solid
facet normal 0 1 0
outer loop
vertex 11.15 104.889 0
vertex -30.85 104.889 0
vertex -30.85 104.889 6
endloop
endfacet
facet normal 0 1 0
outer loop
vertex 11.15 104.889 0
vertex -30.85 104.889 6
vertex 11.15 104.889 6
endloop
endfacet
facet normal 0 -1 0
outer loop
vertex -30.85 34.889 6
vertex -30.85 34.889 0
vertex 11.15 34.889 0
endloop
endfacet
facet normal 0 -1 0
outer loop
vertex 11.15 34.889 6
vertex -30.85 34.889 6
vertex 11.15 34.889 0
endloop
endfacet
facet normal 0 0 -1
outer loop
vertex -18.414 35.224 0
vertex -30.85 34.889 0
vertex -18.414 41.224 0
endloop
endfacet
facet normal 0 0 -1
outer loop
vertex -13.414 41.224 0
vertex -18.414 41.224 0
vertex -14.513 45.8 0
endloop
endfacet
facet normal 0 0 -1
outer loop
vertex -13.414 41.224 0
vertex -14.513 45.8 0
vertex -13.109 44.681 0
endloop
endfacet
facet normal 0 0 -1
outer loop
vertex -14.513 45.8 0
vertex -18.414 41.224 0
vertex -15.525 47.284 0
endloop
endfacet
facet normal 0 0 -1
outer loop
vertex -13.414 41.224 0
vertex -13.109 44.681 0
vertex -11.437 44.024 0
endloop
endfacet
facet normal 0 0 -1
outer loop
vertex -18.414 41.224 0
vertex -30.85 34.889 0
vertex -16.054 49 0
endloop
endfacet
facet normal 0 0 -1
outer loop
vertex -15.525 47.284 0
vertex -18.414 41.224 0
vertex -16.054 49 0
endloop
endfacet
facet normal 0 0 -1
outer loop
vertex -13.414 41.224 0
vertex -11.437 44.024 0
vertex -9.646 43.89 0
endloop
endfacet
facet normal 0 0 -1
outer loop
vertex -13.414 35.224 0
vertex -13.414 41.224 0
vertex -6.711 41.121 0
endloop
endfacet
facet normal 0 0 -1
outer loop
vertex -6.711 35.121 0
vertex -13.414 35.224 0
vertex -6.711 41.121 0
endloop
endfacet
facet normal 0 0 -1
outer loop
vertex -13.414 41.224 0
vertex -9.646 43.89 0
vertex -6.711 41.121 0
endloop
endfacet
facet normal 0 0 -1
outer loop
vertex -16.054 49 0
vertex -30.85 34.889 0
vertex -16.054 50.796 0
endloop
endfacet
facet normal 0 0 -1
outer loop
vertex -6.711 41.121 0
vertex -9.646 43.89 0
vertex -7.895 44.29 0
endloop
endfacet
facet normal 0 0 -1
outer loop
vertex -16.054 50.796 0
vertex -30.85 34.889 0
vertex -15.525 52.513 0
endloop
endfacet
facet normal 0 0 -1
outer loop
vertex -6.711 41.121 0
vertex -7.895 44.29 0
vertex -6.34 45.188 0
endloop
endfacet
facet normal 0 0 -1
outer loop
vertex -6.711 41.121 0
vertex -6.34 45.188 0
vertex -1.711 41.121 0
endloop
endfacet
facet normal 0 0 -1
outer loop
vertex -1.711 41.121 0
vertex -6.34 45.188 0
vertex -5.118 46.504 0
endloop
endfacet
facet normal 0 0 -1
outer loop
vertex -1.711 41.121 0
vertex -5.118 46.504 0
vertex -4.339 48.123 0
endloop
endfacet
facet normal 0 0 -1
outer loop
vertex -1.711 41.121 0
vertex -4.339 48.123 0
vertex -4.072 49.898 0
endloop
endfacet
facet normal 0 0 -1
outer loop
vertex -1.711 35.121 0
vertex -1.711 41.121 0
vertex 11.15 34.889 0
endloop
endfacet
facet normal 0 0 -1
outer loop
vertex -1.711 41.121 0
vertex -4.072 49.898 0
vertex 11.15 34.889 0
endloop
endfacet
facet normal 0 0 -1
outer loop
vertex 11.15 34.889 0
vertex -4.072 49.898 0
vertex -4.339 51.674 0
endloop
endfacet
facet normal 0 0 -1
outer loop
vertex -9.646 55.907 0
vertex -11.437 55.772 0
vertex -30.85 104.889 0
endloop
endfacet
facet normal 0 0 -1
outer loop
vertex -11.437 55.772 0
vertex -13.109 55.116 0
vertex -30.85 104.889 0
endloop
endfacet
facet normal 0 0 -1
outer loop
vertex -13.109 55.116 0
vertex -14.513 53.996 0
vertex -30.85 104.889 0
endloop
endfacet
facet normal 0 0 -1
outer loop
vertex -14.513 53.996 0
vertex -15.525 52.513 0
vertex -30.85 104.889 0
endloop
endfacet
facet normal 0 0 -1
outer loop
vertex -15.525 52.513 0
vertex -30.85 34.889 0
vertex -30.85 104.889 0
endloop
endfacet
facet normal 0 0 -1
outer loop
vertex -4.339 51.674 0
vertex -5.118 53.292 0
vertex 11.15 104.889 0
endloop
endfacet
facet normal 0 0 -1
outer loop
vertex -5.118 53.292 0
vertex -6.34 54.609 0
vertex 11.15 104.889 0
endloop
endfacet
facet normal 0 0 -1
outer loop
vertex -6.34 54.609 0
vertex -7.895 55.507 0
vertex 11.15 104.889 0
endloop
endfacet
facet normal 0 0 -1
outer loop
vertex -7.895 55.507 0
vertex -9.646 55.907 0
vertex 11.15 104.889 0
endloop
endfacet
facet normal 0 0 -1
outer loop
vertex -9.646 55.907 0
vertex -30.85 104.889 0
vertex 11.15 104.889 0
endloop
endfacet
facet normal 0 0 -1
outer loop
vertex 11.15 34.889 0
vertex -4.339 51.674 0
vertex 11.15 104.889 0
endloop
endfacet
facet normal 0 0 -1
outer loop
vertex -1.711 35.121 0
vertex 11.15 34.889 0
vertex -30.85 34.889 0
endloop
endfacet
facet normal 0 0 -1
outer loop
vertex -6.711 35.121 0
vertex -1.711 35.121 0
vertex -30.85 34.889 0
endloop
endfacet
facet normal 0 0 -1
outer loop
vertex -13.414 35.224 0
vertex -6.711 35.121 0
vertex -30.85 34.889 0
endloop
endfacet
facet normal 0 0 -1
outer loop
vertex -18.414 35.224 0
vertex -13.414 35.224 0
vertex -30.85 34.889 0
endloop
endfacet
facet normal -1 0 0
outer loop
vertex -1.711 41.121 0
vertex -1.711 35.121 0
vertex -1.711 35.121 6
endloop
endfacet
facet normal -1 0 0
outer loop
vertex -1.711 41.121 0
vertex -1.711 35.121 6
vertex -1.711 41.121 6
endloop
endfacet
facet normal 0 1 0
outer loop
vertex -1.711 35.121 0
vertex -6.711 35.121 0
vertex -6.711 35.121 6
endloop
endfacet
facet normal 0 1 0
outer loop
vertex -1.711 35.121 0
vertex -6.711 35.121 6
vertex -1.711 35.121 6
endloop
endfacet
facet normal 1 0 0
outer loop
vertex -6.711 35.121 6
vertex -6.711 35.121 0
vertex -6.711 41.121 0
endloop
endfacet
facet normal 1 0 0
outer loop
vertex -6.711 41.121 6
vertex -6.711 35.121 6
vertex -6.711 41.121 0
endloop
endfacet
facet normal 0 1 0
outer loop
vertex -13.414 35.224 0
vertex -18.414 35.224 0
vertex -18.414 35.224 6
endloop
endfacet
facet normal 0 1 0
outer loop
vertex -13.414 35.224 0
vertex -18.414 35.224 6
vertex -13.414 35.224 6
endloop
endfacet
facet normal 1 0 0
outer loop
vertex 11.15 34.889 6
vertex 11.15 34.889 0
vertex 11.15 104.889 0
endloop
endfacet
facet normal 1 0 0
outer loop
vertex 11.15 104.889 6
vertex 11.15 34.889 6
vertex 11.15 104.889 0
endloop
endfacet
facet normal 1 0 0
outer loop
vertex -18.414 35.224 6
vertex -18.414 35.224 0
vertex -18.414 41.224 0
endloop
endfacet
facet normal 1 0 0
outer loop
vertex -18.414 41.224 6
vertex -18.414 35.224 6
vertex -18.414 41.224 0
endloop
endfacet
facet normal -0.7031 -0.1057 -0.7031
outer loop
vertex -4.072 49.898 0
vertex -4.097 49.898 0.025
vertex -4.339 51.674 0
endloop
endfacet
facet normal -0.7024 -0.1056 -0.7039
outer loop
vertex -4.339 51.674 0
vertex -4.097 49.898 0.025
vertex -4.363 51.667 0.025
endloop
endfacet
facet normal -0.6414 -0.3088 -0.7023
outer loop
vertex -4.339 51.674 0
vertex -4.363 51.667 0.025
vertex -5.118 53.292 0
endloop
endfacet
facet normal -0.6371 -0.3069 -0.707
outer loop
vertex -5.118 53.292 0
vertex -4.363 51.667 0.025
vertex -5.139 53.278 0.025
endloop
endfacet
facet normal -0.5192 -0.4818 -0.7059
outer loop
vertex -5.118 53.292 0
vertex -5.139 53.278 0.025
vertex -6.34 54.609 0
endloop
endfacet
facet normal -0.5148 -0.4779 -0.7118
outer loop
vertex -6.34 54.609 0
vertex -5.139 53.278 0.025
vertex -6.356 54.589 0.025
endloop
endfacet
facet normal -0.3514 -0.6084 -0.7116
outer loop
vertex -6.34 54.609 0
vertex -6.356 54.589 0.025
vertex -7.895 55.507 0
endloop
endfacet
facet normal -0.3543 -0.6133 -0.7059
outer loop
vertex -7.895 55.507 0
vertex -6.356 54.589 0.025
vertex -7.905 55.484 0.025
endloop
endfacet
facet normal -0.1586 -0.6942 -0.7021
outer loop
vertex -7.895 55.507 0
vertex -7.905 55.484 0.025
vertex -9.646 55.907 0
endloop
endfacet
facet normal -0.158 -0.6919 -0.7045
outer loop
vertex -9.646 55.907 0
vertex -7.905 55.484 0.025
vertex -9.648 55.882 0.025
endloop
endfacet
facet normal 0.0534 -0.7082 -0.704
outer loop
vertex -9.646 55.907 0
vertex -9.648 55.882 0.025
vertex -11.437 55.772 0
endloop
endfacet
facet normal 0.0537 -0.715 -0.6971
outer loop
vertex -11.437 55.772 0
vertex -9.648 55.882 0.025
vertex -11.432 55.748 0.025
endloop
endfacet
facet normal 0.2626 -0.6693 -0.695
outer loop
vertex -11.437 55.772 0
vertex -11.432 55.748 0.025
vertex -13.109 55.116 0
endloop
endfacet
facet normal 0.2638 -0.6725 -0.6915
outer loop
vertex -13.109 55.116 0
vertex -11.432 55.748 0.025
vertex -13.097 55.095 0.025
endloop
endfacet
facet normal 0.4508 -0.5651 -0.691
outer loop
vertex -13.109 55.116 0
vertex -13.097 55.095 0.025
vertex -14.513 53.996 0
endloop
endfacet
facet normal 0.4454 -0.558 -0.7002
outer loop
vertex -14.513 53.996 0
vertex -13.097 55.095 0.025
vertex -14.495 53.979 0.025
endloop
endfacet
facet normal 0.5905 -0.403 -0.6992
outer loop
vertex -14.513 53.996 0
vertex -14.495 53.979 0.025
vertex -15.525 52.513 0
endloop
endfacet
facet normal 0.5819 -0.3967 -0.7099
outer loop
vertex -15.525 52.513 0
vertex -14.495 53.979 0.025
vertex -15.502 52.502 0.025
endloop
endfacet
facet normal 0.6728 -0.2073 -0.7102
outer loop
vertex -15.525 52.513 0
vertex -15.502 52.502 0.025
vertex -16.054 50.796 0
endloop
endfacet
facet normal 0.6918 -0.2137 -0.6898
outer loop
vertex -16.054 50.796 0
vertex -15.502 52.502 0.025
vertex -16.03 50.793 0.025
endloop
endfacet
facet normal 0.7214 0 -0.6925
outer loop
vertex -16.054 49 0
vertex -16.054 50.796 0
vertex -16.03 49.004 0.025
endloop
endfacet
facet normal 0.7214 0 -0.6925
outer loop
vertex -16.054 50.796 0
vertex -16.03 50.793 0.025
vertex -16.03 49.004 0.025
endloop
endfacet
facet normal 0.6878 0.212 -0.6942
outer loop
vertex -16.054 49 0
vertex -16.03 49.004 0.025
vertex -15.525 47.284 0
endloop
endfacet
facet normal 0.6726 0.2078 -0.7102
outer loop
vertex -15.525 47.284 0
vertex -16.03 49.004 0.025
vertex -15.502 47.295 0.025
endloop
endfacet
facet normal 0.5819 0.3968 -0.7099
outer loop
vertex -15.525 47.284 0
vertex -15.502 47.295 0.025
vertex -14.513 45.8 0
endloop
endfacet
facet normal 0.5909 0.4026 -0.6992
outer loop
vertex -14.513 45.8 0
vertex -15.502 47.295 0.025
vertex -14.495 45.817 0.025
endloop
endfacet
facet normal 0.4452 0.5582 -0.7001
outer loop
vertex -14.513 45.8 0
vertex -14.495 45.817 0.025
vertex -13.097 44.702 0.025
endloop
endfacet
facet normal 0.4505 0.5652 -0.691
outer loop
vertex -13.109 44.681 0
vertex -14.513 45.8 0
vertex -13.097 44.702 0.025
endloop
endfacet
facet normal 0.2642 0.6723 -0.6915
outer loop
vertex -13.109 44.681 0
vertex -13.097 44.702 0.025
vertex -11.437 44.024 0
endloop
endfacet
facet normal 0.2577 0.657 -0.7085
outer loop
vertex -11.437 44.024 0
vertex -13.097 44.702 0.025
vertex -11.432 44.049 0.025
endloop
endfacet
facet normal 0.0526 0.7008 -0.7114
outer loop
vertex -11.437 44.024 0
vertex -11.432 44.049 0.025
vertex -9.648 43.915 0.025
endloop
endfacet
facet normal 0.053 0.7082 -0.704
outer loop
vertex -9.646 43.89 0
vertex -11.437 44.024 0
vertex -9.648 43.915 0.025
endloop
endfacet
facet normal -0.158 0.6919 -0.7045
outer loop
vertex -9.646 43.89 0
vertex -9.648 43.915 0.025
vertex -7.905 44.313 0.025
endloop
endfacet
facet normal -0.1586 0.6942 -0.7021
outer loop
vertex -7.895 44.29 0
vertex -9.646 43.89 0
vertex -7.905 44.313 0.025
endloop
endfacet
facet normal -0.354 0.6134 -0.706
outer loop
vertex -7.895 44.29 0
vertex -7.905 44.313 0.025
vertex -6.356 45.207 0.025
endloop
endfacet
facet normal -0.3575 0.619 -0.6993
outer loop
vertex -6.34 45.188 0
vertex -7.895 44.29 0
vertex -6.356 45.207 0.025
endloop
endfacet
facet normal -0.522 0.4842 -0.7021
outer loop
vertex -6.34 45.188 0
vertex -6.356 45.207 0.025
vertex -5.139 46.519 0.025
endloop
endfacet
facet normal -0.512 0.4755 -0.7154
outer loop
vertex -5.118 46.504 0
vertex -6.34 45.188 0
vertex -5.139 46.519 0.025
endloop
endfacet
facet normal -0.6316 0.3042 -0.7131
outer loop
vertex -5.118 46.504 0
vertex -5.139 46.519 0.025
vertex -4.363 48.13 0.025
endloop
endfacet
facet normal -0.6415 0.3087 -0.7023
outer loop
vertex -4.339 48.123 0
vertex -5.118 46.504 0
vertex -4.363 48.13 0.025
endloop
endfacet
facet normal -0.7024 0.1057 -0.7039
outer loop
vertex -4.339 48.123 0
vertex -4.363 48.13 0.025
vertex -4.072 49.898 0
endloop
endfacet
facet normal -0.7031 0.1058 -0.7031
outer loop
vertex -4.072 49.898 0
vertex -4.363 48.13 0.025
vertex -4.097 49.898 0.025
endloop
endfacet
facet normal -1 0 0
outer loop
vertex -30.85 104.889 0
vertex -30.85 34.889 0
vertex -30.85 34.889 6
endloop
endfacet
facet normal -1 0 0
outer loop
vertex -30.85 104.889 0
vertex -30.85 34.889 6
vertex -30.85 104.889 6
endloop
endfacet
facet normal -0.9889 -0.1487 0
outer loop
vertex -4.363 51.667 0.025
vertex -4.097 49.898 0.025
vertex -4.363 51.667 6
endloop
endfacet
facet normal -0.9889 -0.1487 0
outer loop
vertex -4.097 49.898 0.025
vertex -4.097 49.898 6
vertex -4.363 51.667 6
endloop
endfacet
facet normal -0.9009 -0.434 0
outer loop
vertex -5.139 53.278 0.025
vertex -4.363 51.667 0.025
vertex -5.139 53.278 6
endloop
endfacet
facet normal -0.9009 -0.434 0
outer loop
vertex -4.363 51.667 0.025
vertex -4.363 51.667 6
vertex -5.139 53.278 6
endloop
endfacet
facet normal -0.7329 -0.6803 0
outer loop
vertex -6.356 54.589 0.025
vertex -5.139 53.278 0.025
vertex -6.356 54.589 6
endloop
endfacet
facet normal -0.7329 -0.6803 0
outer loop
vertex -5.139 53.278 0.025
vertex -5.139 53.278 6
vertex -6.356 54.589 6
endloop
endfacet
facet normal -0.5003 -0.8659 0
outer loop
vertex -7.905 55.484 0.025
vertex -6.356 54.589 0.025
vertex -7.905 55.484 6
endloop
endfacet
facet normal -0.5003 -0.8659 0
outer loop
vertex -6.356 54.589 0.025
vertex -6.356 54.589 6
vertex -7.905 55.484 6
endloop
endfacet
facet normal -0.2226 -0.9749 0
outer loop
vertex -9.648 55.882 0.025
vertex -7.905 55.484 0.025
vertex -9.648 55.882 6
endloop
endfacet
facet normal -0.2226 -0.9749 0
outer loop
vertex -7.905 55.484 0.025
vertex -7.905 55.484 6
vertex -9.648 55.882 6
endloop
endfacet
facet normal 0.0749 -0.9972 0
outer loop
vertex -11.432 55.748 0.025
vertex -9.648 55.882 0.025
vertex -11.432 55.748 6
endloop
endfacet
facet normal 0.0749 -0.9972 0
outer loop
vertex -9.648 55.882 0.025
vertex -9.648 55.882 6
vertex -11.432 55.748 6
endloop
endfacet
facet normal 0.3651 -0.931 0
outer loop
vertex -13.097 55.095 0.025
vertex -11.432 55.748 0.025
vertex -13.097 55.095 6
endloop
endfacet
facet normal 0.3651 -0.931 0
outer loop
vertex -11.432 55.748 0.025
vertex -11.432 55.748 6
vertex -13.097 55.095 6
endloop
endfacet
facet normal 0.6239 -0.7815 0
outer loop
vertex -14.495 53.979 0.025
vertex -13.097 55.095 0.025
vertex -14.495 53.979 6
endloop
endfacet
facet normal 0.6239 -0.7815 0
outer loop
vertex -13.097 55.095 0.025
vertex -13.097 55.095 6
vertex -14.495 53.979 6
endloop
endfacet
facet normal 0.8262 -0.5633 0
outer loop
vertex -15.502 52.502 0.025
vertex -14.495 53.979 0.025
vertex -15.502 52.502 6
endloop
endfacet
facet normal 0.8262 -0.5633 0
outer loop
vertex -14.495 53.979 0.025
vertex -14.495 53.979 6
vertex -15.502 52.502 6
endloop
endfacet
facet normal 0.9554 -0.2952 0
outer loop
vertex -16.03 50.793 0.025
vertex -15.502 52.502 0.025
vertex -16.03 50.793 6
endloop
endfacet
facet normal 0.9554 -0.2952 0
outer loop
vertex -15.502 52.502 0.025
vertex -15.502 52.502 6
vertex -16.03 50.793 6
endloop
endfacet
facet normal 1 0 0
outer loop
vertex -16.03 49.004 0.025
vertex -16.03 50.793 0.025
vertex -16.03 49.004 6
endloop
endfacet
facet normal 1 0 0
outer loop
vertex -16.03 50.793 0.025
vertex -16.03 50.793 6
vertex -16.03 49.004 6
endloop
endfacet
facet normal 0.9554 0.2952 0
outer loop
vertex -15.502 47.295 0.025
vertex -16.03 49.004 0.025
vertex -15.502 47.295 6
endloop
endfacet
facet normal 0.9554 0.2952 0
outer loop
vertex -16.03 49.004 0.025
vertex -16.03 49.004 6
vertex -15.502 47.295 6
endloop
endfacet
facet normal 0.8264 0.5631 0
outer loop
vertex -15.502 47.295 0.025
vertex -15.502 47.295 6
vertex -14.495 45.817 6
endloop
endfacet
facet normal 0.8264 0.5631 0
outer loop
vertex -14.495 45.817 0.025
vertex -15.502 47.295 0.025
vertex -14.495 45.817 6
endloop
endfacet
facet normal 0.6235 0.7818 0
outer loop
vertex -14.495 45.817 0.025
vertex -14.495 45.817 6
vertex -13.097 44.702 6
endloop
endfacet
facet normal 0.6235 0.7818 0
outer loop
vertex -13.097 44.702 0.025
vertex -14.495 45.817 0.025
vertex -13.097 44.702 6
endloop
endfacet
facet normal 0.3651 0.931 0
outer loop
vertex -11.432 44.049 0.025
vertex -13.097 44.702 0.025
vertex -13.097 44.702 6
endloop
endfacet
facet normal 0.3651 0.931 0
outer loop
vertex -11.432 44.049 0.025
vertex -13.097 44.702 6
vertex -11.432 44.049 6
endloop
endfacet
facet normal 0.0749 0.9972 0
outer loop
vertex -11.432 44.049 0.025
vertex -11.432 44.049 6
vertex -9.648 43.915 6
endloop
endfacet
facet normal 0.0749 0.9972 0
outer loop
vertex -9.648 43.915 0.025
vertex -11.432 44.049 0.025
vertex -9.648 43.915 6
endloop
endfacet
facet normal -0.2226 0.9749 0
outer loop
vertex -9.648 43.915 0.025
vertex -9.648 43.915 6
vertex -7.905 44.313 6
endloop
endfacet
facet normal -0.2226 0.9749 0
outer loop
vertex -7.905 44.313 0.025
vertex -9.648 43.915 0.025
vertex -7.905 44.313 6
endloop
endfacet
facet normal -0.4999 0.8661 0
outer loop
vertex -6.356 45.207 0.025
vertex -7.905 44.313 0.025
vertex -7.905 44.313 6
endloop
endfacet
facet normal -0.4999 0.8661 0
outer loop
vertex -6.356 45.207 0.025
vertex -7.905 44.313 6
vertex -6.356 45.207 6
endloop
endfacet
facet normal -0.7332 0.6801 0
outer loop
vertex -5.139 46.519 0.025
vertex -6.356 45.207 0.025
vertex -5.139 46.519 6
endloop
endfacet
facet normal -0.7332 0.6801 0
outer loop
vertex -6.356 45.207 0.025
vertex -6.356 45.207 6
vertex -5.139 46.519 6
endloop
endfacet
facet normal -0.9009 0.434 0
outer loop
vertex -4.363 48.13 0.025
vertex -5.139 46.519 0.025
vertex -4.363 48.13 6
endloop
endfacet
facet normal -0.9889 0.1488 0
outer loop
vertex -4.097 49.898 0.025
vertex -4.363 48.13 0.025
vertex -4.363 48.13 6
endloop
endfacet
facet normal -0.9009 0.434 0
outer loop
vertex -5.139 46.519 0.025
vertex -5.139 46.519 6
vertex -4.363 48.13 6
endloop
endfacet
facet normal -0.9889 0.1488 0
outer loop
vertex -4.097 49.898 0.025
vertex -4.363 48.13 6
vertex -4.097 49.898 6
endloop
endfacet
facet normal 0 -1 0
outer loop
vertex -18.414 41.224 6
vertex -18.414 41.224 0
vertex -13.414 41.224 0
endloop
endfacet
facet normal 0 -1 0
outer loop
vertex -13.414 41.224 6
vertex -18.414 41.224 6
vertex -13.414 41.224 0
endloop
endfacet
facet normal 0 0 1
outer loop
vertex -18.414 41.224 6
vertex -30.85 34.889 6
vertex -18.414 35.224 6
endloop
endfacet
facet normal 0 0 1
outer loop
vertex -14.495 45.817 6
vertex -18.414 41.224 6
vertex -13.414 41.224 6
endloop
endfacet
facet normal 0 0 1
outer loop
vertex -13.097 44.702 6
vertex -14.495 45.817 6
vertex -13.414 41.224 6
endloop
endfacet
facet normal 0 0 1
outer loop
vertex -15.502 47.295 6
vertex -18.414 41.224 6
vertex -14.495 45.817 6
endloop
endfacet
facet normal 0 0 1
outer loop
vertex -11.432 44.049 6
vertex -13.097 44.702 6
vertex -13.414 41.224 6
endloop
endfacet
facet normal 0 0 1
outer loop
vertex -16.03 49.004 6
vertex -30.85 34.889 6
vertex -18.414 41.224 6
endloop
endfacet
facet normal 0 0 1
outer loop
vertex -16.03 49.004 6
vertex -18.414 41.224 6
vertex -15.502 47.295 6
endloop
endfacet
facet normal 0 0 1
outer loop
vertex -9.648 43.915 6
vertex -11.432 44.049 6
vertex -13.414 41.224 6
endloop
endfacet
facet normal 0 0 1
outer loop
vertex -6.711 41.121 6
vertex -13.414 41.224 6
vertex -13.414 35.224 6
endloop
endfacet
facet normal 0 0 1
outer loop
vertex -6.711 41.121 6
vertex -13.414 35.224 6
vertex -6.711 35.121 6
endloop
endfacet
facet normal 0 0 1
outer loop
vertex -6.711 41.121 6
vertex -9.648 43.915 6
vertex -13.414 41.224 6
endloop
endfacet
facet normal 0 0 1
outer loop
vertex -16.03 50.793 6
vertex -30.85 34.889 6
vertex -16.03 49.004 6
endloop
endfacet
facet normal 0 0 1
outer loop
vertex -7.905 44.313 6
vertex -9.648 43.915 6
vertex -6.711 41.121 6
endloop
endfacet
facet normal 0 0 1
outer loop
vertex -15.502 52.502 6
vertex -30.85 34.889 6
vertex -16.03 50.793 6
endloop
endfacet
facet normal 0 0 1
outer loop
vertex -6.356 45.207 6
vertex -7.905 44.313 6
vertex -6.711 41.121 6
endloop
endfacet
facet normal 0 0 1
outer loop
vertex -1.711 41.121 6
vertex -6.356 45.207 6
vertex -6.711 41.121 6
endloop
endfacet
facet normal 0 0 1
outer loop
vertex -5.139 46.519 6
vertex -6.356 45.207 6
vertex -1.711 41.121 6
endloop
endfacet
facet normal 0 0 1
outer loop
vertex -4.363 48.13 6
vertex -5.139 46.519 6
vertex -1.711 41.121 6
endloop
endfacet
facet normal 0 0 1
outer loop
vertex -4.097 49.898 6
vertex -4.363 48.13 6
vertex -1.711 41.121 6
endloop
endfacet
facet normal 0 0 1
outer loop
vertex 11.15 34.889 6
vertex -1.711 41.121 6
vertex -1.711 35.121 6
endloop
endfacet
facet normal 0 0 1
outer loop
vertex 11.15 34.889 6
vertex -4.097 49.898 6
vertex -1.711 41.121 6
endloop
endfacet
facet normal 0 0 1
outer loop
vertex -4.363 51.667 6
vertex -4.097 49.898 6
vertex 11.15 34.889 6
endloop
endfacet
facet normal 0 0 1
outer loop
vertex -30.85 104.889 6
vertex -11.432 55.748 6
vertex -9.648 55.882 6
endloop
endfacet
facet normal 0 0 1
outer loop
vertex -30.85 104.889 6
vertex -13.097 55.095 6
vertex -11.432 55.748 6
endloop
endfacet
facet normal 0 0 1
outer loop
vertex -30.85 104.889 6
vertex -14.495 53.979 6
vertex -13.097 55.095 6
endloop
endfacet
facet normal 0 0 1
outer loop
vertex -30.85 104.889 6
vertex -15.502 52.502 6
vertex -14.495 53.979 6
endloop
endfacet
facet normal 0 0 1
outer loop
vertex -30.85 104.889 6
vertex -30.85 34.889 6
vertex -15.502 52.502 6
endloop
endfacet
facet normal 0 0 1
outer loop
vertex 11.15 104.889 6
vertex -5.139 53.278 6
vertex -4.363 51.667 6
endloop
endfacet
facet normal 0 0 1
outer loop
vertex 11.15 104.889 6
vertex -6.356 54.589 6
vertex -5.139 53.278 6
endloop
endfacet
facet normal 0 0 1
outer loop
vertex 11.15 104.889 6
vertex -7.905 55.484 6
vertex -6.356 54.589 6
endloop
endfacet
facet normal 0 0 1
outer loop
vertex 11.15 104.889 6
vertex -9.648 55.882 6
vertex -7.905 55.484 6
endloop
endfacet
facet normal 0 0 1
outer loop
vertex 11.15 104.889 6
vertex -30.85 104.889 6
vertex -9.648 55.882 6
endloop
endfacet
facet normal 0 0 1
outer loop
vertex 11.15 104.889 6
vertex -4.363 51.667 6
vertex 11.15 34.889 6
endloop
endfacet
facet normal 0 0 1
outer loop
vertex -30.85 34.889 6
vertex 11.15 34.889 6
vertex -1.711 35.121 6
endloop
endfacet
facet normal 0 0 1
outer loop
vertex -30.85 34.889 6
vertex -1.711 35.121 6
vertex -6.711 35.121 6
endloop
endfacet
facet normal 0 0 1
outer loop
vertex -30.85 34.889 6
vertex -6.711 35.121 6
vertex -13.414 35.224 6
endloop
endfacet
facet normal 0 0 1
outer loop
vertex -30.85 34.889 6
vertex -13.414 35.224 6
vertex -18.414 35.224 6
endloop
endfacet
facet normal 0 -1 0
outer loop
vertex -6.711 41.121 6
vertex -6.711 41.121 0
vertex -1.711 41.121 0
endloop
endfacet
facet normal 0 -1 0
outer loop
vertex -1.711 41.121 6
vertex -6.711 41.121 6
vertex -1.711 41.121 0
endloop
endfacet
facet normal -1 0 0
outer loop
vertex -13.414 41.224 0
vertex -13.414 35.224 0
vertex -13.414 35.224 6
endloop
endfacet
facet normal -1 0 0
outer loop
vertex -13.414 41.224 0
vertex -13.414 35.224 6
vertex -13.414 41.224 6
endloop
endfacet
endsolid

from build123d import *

# Parameters (mm, degrees)
SKETCH1_W                        = 42
SKETCH1_H                        = 70
BOSS_EXTRUDE1_DEPTH              = 6
SKETCH2_W                        = 5
SKETCH2_H                        = 6
CUT_EXTRUDE1_DEPTH               = 9
F_12_0MM_DOWEL_HOLE1_D           = 12
F_12_0MM_DOWEL_HOLE1_DEPTH       = 50
F_12_0MM_DOWEL_HOLE1_CSINK_D     = 12.05
F_12_0MM_DOWEL_HOLE1_CSINK_ANGLE = 90
F_12_0MM_DOWEL_HOLE1_TIP         = 3.605163714


with BuildPart() as part:
    # Sketch1 → Boss-Extrude1 (new body)
    with BuildSketch(Plane.XY):
        with Locations((-9.849777317, 69.889242879)):
            Rectangle(SKETCH1_W, SKETCH1_H)
    extrude(amount=BOSS_EXTRUDE1_DEPTH)

    # Sketch2 → Cut-Extrude1 (cut)
    with BuildSketch(Plane.XY):
        with Locations((-4.211301735, 38.120527714)):
            Rectangle(SKETCH2_W, SKETCH2_H)
        with Locations((-15.91362892, 38.2243844)):
            Rectangle(SKETCH2_W, SKETCH2_H)
    extrude(amount=CUT_EXTRUDE1_DEPTH, mode=Mode.SUBTRACT)

    # Ø12.0mm Dowel Hole1
    with Locations(Plane(origin=(0, 0, 0), x_dir=(-1, 0, 0), z_dir=(0, 0, -1))):
        with Locations((10.096577426, 49.898434055)):
            CounterSinkHole(F_12_0MM_DOWEL_HOLE1_D / 2, F_12_0MM_DOWEL_HOLE1_CSINK_D / 2, depth=F_12_0MM_DOWEL_HOLE1_DEPTH, counter_sink_angle=F_12_0MM_DOWEL_HOLE1_CSINK_ANGLE)
            with Locations((0, 0, -(F_12_0MM_DOWEL_HOLE1_DEPTH + F_12_0MM_DOWEL_HOLE1_TIP / 2))):  # 118° drill point
                Cone(0, F_12_0MM_DOWEL_HOLE1_D / 2, F_12_0MM_DOWEL_HOLE1_TIP, mode=Mode.SUBTRACT)


solid = part.part
